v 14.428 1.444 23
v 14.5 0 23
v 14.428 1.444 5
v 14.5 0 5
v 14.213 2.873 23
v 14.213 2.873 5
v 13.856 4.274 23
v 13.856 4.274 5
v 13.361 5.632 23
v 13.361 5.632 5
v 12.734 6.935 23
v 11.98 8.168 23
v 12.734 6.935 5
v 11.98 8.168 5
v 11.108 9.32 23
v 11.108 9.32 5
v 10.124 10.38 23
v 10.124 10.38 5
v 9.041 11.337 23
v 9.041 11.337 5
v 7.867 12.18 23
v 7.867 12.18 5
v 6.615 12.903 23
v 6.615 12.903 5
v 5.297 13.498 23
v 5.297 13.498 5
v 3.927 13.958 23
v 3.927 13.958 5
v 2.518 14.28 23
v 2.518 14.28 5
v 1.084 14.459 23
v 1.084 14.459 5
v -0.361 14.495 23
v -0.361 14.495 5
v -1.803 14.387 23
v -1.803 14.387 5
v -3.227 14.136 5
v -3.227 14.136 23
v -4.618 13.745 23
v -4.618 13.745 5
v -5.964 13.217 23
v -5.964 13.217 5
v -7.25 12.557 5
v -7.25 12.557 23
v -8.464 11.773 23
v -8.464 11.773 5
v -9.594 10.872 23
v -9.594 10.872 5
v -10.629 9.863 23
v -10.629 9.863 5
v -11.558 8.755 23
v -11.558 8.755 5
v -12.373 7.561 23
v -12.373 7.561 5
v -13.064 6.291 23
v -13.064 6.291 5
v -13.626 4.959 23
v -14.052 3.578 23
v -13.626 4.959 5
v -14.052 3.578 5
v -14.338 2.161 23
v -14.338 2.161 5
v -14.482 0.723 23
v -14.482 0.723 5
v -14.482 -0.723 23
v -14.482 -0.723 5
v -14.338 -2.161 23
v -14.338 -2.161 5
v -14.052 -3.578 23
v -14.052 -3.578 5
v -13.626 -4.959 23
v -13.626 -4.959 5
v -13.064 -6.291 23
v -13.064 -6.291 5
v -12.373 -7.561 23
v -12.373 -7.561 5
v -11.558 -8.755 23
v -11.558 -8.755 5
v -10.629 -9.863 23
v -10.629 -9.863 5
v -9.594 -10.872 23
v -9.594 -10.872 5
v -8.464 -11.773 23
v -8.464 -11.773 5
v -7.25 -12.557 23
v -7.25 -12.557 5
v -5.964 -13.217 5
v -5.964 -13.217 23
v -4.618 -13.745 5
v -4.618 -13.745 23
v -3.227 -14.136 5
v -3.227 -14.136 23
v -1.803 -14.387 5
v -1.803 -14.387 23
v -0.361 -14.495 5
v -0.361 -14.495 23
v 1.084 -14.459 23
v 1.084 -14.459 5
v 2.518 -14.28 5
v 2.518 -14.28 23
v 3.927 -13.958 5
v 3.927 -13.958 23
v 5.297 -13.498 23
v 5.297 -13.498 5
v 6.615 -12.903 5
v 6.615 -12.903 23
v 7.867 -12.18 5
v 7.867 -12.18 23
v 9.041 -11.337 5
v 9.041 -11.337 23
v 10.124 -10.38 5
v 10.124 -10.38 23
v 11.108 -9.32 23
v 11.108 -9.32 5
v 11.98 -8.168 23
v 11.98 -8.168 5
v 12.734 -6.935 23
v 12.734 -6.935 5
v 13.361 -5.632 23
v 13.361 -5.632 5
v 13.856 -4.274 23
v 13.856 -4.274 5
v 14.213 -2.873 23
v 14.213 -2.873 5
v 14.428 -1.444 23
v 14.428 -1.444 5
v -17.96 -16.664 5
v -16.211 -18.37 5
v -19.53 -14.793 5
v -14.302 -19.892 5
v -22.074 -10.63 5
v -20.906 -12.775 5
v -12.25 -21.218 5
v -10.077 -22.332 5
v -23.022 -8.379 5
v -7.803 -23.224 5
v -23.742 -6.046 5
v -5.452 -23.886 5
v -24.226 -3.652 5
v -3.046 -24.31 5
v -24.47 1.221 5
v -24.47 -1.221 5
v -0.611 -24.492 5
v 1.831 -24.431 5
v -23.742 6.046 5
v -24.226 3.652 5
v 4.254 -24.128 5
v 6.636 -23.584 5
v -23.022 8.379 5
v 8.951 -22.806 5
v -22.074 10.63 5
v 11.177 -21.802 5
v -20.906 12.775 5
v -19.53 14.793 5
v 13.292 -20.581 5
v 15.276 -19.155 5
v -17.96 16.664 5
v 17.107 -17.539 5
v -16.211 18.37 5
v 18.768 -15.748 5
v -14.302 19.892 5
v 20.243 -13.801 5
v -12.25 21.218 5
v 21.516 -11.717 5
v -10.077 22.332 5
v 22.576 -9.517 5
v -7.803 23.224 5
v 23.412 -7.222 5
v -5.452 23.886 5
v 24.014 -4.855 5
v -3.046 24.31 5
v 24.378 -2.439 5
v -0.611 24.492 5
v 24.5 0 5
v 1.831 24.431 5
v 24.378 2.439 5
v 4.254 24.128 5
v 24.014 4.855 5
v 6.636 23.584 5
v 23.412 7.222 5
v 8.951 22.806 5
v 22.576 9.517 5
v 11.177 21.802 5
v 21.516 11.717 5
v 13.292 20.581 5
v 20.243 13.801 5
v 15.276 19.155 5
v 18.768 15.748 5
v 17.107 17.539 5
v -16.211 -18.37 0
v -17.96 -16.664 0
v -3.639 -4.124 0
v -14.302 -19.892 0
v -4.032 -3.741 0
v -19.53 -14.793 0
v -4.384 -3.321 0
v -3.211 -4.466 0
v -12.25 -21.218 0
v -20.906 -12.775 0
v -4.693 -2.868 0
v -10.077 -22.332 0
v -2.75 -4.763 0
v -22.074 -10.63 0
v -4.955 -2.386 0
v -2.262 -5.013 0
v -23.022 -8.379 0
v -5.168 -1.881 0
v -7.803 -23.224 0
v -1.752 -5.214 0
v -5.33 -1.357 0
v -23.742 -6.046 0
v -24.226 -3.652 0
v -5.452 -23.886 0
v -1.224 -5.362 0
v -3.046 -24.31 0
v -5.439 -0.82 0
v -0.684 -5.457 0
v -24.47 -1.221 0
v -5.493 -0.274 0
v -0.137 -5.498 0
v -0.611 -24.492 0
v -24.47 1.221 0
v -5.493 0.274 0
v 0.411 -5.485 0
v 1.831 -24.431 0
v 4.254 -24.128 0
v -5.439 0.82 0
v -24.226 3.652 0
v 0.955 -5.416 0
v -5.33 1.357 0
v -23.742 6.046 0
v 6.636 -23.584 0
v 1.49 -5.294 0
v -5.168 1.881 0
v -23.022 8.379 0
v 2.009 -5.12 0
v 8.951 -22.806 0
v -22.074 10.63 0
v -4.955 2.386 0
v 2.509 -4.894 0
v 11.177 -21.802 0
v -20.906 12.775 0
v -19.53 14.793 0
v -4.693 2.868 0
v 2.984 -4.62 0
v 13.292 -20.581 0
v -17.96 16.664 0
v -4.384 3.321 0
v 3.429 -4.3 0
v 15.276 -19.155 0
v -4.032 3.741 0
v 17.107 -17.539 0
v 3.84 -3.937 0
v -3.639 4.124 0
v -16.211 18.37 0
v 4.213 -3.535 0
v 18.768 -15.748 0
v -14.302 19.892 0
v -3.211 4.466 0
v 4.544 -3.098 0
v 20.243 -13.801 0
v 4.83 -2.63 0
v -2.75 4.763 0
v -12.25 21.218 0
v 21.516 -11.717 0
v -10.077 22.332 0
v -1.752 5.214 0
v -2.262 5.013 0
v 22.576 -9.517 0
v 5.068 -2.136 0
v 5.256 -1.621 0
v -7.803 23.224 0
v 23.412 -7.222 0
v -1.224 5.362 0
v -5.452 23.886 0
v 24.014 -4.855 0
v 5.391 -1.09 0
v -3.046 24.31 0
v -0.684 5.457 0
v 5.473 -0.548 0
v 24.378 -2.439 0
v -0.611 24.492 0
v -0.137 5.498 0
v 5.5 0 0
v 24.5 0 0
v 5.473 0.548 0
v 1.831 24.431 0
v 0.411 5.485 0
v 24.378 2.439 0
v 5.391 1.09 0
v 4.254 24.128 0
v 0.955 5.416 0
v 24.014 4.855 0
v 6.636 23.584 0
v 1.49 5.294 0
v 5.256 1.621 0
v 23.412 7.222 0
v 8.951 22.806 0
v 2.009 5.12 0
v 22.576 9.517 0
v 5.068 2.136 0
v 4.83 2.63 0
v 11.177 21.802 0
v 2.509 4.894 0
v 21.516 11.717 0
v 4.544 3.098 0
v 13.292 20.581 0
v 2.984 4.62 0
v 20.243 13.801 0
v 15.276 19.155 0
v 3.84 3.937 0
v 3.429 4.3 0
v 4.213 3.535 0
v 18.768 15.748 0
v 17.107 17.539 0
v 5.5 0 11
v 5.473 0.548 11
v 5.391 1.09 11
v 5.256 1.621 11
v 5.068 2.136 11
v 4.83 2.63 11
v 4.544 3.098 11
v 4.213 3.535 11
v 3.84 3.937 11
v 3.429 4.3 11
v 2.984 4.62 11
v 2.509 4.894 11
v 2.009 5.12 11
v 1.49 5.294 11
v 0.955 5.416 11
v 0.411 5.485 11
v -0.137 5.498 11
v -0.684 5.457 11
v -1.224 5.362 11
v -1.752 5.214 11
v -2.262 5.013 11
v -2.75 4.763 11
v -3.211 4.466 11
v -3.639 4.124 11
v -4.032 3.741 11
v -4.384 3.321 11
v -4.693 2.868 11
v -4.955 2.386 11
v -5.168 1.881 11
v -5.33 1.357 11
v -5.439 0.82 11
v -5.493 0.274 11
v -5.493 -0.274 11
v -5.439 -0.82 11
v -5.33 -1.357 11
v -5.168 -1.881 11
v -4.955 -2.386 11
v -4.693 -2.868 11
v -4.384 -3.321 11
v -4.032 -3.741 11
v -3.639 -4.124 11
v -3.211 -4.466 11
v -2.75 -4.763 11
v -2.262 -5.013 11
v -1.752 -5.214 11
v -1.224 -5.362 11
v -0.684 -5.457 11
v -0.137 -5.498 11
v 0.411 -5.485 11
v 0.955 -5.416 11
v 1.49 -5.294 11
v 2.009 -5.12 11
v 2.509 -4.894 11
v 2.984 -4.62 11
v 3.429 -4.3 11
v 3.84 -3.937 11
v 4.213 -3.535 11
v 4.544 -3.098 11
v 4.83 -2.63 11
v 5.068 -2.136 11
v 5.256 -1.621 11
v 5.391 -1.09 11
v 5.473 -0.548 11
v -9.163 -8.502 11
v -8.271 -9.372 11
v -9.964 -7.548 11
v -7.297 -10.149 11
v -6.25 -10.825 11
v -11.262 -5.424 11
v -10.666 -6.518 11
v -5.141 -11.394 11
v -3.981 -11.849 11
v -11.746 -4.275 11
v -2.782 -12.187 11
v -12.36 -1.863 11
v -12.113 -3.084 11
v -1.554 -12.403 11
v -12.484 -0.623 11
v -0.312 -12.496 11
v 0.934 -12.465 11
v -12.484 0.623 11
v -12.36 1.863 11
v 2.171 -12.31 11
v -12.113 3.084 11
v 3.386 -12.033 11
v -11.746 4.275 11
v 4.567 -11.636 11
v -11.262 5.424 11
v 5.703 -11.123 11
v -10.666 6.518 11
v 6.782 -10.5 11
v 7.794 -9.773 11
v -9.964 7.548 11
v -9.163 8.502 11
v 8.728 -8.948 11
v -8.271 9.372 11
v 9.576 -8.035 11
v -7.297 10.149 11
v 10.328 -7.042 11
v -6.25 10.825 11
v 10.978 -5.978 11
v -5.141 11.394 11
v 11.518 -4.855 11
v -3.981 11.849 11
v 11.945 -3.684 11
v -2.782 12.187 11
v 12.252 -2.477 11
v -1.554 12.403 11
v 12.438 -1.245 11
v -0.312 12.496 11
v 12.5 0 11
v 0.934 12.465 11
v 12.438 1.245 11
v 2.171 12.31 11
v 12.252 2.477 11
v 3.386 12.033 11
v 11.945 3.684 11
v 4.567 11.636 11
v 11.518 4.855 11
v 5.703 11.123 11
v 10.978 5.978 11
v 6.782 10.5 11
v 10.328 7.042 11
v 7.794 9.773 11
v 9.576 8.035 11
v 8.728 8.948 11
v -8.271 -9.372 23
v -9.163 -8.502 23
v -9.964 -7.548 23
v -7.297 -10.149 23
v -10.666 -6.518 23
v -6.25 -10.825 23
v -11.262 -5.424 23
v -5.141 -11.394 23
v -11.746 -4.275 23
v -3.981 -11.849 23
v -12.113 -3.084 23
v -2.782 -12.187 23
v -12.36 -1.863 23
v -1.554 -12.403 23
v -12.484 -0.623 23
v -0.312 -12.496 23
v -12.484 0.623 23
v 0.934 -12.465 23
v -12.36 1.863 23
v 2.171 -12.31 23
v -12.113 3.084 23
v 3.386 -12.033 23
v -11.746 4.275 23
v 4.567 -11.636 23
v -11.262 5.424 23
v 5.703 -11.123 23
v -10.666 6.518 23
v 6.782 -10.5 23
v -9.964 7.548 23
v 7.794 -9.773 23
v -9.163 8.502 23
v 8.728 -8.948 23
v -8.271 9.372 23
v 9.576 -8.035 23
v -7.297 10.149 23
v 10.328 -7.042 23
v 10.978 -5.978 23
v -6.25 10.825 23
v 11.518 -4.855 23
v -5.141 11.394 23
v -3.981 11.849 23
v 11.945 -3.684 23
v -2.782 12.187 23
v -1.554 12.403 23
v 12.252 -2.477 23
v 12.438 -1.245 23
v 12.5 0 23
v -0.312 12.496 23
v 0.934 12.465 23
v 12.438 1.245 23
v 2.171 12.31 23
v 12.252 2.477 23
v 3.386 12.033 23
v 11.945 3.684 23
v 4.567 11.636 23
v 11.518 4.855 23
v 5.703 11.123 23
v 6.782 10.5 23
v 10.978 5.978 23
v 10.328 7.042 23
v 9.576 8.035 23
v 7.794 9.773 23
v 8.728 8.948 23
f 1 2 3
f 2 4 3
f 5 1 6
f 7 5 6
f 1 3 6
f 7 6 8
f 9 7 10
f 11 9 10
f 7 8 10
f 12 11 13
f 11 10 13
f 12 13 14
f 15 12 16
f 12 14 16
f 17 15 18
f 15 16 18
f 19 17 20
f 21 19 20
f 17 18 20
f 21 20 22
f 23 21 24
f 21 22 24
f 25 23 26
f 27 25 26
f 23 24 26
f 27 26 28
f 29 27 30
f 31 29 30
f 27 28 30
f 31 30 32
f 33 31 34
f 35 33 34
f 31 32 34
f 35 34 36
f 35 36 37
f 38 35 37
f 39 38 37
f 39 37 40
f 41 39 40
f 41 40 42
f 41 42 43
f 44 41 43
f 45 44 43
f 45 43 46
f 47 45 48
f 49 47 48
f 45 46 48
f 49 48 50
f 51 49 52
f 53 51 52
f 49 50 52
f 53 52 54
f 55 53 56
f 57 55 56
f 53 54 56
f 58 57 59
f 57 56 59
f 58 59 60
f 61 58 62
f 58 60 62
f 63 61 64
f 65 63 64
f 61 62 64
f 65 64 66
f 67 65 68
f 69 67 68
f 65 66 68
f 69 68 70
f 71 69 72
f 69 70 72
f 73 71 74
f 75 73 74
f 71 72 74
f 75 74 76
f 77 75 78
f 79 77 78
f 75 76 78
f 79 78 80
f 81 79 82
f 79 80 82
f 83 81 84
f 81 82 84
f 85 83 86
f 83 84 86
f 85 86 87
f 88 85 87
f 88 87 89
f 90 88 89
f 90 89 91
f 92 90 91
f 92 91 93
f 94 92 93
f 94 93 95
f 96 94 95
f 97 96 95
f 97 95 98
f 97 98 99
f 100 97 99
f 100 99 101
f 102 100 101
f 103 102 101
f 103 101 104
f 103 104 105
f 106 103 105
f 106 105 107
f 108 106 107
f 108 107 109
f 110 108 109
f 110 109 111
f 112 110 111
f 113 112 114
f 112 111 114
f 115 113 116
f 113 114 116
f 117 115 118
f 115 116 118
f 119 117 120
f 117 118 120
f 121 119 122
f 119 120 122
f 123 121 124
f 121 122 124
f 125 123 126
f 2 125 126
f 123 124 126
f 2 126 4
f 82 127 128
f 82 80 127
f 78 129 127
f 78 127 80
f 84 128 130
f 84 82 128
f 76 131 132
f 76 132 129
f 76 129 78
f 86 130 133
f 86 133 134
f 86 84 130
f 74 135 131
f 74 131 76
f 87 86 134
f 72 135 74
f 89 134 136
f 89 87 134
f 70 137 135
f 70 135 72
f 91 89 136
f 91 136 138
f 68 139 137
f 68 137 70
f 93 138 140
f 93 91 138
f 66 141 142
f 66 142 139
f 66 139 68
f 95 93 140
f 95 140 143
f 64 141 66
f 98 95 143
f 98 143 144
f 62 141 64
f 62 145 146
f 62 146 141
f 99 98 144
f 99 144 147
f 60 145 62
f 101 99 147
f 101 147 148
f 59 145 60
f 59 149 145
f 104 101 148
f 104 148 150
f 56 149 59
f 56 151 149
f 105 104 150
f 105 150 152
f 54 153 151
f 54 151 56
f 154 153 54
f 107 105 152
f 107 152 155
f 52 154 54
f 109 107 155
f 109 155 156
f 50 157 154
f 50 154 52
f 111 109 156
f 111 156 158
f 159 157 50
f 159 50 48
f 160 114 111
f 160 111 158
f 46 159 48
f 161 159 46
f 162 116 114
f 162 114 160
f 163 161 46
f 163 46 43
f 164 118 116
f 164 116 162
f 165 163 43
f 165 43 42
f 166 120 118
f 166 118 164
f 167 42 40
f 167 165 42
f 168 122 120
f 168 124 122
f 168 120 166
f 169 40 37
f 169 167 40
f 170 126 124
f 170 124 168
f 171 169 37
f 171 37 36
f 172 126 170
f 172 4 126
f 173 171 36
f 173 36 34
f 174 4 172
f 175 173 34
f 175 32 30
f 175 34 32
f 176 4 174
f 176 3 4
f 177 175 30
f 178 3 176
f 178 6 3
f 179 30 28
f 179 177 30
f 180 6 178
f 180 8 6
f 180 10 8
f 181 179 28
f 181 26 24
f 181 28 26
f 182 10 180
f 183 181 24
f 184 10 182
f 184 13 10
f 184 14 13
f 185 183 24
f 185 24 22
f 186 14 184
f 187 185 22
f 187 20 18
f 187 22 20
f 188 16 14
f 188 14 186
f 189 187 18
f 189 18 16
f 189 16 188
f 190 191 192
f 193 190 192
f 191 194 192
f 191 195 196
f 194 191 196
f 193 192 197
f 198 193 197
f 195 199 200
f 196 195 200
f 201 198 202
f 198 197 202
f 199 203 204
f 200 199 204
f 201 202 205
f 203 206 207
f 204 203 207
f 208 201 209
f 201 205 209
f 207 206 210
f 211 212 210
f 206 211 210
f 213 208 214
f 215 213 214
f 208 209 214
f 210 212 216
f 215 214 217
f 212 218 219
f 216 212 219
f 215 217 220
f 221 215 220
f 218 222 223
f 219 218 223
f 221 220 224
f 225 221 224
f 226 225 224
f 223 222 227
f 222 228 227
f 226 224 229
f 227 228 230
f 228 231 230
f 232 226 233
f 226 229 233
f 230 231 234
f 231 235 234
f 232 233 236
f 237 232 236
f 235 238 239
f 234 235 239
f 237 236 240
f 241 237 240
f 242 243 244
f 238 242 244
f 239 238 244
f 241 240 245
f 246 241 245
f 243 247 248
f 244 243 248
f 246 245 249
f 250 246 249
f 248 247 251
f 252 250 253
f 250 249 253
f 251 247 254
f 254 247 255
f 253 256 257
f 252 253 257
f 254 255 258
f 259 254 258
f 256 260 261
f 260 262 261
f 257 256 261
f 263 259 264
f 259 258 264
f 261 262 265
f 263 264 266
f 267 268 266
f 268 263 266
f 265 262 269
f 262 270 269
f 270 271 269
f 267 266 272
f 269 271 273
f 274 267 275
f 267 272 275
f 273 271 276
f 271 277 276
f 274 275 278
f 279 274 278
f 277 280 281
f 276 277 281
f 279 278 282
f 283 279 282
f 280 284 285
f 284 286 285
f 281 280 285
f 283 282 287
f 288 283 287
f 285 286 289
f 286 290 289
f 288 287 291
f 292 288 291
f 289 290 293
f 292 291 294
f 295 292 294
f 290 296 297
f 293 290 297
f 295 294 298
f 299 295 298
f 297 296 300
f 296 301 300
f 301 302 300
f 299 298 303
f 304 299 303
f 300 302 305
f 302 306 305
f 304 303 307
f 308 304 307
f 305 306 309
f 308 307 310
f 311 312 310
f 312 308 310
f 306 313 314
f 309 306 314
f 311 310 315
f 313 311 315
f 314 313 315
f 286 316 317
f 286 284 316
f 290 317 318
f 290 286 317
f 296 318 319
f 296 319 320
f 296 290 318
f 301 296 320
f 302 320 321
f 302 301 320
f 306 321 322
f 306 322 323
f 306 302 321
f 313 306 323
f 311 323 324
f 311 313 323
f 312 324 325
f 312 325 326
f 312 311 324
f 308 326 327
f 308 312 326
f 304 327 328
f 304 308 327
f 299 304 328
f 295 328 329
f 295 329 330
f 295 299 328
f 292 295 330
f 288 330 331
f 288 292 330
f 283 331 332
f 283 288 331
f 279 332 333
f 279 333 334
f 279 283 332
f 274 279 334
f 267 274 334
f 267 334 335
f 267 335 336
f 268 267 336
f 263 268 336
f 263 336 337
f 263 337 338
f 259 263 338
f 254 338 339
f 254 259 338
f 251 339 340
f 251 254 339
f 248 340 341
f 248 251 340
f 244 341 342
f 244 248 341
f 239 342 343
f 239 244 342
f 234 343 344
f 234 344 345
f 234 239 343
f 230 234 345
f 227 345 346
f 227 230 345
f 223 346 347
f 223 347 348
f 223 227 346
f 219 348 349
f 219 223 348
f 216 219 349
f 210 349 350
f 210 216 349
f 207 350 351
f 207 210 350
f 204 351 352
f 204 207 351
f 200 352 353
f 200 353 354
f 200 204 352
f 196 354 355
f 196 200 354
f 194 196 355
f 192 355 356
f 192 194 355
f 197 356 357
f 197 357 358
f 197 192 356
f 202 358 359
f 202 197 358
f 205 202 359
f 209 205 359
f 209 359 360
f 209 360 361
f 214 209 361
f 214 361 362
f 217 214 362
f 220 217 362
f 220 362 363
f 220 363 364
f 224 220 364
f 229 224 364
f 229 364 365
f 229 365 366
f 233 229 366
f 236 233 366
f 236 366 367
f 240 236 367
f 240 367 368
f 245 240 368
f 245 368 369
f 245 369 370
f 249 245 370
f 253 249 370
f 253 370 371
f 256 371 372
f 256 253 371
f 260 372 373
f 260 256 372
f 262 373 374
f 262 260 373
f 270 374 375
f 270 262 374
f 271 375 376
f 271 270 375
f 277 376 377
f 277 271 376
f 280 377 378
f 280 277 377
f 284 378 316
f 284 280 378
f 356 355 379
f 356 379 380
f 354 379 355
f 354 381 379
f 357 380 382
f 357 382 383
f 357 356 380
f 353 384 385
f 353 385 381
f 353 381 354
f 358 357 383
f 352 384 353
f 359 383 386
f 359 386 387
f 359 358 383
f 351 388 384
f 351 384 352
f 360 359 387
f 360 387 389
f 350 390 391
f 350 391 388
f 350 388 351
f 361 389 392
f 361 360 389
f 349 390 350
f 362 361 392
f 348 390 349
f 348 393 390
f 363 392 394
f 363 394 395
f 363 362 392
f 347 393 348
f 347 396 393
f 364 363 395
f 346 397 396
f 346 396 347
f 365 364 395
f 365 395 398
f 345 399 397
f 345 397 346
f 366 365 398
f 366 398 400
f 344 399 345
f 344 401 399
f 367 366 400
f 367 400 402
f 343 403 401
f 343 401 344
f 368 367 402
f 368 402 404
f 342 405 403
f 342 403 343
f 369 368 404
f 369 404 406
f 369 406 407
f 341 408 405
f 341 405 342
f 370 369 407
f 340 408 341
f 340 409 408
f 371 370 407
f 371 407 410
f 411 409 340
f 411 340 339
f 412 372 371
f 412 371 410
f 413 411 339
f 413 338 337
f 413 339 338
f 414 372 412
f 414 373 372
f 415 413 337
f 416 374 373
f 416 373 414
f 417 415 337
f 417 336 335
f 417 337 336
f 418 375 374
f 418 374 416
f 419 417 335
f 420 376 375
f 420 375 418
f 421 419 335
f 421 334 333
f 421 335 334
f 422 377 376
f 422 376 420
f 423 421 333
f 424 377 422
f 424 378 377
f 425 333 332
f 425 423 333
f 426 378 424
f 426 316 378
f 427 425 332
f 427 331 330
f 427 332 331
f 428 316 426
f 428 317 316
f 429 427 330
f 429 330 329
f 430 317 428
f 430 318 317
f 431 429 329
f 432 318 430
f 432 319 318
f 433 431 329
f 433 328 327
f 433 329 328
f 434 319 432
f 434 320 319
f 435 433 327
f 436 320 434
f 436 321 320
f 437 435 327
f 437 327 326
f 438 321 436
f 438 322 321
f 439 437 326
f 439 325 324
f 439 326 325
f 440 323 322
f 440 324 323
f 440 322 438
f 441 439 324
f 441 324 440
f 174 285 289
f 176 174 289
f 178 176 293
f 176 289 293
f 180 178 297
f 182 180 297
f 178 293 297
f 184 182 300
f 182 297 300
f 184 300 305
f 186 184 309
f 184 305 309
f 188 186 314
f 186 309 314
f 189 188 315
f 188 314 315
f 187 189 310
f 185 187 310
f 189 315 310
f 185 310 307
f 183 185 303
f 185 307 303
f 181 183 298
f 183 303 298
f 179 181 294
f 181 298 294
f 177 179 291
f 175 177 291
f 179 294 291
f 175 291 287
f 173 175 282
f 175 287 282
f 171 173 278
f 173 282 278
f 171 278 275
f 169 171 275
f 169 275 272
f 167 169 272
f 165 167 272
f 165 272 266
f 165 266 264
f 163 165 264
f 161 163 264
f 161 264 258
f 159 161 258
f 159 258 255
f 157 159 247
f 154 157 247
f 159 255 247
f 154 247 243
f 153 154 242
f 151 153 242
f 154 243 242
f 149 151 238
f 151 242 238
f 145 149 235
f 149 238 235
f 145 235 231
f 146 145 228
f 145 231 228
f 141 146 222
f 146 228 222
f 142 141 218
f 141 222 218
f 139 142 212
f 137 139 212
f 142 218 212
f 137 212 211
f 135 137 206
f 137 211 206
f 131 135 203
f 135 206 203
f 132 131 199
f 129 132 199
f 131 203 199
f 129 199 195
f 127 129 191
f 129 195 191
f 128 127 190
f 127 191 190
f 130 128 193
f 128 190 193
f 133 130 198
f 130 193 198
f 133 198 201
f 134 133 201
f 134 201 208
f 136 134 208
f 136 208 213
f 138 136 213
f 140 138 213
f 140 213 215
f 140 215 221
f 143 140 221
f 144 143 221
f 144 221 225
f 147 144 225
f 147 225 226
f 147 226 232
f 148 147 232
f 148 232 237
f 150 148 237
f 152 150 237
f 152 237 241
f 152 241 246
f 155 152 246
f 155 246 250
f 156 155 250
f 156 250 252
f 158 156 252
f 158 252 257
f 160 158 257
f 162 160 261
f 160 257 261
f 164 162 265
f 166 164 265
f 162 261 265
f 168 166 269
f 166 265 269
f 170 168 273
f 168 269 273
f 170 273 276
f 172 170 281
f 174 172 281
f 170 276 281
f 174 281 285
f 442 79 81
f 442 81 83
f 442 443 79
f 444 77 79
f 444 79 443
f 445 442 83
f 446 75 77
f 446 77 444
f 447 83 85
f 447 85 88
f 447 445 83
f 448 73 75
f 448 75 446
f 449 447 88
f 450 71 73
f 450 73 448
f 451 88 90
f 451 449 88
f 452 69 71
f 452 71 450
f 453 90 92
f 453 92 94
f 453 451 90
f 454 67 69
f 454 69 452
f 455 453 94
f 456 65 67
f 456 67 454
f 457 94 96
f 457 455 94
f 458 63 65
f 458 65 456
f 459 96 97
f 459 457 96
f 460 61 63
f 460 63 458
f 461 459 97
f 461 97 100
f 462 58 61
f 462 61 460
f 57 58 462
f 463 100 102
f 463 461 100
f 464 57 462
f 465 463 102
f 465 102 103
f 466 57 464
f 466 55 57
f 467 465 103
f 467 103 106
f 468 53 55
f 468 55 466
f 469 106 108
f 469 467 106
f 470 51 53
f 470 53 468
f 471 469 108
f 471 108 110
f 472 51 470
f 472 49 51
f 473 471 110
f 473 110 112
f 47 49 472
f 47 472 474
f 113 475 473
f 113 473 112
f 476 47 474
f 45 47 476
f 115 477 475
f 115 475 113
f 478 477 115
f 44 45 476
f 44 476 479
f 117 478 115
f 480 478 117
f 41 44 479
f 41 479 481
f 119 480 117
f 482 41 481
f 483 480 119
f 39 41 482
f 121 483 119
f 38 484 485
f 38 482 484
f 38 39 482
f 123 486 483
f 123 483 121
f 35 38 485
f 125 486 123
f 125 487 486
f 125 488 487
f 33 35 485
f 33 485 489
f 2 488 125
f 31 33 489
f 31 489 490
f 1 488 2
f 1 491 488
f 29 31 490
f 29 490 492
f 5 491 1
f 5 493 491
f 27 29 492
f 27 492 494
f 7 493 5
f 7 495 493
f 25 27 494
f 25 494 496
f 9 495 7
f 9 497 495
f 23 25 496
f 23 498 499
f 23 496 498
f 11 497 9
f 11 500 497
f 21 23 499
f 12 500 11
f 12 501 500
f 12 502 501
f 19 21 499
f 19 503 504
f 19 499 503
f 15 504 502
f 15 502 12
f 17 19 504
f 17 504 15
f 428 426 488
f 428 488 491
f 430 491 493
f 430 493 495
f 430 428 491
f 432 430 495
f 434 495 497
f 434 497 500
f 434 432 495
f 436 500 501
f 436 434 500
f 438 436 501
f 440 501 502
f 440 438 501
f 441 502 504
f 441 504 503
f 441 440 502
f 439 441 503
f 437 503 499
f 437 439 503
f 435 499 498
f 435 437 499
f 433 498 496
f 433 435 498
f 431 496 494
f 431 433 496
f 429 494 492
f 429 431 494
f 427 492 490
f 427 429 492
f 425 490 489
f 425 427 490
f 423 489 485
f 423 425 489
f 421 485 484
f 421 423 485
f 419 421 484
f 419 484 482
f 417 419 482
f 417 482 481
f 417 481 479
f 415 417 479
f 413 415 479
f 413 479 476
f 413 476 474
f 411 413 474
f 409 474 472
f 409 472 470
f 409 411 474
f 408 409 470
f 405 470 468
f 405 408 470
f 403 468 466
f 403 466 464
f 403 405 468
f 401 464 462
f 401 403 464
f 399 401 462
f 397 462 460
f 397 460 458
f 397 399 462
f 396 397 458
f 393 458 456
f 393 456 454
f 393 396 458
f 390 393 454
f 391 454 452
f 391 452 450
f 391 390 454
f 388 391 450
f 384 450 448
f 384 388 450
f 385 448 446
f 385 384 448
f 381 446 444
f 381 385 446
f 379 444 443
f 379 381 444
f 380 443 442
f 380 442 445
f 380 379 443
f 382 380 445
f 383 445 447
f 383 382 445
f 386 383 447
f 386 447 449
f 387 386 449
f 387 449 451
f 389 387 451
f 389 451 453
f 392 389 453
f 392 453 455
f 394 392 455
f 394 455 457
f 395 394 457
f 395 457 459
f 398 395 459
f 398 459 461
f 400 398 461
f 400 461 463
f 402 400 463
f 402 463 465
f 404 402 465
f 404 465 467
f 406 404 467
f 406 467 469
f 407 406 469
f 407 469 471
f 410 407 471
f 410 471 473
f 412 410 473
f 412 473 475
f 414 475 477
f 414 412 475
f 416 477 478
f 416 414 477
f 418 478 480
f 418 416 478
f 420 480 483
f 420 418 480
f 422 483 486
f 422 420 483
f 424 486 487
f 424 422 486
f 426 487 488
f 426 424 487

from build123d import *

# Parameters (mm, degrees)
F0_R     = 24.5
F0_R_2   = 5.5
F1_DEPTH = 5
F2_R     = 14.5
F2_R_2   = 5.5
F3_DEPTH = 6
F4_R     = 12.5
F4_R_2   = 10
F4_R_3   = 14.5
F5_DEPTH = 12


with BuildPart() as f1:
    # F0 (on Top) → F1 (new body)
    with BuildSketch(Plane.XY):
        Circle(F0_R)
        Circle(F0_R_2, mode=Mode.SUBTRACT)
    extrude(amount=F1_DEPTH)

    # F2 (on face) → F3 (join)
    with BuildSketch(Plane.XY.offset(5)):
        Circle(F2_R)
        Circle(F2_R_2, mode=Mode.SUBTRACT)
    extrude(amount=F3_DEPTH)

    # F4 (on face) → F5 (join)
    with BuildSketch(Plane.XY.offset(11)):
        Circle(F4_R)
        Circle(F4_R_2, mode=Mode.SUBTRACT)
        Circle(F4_R_3)
        Circle(F4_R, mode=Mode.SUBTRACT)
    extrude(amount=F5_DEPTH)


solid = f1.part
